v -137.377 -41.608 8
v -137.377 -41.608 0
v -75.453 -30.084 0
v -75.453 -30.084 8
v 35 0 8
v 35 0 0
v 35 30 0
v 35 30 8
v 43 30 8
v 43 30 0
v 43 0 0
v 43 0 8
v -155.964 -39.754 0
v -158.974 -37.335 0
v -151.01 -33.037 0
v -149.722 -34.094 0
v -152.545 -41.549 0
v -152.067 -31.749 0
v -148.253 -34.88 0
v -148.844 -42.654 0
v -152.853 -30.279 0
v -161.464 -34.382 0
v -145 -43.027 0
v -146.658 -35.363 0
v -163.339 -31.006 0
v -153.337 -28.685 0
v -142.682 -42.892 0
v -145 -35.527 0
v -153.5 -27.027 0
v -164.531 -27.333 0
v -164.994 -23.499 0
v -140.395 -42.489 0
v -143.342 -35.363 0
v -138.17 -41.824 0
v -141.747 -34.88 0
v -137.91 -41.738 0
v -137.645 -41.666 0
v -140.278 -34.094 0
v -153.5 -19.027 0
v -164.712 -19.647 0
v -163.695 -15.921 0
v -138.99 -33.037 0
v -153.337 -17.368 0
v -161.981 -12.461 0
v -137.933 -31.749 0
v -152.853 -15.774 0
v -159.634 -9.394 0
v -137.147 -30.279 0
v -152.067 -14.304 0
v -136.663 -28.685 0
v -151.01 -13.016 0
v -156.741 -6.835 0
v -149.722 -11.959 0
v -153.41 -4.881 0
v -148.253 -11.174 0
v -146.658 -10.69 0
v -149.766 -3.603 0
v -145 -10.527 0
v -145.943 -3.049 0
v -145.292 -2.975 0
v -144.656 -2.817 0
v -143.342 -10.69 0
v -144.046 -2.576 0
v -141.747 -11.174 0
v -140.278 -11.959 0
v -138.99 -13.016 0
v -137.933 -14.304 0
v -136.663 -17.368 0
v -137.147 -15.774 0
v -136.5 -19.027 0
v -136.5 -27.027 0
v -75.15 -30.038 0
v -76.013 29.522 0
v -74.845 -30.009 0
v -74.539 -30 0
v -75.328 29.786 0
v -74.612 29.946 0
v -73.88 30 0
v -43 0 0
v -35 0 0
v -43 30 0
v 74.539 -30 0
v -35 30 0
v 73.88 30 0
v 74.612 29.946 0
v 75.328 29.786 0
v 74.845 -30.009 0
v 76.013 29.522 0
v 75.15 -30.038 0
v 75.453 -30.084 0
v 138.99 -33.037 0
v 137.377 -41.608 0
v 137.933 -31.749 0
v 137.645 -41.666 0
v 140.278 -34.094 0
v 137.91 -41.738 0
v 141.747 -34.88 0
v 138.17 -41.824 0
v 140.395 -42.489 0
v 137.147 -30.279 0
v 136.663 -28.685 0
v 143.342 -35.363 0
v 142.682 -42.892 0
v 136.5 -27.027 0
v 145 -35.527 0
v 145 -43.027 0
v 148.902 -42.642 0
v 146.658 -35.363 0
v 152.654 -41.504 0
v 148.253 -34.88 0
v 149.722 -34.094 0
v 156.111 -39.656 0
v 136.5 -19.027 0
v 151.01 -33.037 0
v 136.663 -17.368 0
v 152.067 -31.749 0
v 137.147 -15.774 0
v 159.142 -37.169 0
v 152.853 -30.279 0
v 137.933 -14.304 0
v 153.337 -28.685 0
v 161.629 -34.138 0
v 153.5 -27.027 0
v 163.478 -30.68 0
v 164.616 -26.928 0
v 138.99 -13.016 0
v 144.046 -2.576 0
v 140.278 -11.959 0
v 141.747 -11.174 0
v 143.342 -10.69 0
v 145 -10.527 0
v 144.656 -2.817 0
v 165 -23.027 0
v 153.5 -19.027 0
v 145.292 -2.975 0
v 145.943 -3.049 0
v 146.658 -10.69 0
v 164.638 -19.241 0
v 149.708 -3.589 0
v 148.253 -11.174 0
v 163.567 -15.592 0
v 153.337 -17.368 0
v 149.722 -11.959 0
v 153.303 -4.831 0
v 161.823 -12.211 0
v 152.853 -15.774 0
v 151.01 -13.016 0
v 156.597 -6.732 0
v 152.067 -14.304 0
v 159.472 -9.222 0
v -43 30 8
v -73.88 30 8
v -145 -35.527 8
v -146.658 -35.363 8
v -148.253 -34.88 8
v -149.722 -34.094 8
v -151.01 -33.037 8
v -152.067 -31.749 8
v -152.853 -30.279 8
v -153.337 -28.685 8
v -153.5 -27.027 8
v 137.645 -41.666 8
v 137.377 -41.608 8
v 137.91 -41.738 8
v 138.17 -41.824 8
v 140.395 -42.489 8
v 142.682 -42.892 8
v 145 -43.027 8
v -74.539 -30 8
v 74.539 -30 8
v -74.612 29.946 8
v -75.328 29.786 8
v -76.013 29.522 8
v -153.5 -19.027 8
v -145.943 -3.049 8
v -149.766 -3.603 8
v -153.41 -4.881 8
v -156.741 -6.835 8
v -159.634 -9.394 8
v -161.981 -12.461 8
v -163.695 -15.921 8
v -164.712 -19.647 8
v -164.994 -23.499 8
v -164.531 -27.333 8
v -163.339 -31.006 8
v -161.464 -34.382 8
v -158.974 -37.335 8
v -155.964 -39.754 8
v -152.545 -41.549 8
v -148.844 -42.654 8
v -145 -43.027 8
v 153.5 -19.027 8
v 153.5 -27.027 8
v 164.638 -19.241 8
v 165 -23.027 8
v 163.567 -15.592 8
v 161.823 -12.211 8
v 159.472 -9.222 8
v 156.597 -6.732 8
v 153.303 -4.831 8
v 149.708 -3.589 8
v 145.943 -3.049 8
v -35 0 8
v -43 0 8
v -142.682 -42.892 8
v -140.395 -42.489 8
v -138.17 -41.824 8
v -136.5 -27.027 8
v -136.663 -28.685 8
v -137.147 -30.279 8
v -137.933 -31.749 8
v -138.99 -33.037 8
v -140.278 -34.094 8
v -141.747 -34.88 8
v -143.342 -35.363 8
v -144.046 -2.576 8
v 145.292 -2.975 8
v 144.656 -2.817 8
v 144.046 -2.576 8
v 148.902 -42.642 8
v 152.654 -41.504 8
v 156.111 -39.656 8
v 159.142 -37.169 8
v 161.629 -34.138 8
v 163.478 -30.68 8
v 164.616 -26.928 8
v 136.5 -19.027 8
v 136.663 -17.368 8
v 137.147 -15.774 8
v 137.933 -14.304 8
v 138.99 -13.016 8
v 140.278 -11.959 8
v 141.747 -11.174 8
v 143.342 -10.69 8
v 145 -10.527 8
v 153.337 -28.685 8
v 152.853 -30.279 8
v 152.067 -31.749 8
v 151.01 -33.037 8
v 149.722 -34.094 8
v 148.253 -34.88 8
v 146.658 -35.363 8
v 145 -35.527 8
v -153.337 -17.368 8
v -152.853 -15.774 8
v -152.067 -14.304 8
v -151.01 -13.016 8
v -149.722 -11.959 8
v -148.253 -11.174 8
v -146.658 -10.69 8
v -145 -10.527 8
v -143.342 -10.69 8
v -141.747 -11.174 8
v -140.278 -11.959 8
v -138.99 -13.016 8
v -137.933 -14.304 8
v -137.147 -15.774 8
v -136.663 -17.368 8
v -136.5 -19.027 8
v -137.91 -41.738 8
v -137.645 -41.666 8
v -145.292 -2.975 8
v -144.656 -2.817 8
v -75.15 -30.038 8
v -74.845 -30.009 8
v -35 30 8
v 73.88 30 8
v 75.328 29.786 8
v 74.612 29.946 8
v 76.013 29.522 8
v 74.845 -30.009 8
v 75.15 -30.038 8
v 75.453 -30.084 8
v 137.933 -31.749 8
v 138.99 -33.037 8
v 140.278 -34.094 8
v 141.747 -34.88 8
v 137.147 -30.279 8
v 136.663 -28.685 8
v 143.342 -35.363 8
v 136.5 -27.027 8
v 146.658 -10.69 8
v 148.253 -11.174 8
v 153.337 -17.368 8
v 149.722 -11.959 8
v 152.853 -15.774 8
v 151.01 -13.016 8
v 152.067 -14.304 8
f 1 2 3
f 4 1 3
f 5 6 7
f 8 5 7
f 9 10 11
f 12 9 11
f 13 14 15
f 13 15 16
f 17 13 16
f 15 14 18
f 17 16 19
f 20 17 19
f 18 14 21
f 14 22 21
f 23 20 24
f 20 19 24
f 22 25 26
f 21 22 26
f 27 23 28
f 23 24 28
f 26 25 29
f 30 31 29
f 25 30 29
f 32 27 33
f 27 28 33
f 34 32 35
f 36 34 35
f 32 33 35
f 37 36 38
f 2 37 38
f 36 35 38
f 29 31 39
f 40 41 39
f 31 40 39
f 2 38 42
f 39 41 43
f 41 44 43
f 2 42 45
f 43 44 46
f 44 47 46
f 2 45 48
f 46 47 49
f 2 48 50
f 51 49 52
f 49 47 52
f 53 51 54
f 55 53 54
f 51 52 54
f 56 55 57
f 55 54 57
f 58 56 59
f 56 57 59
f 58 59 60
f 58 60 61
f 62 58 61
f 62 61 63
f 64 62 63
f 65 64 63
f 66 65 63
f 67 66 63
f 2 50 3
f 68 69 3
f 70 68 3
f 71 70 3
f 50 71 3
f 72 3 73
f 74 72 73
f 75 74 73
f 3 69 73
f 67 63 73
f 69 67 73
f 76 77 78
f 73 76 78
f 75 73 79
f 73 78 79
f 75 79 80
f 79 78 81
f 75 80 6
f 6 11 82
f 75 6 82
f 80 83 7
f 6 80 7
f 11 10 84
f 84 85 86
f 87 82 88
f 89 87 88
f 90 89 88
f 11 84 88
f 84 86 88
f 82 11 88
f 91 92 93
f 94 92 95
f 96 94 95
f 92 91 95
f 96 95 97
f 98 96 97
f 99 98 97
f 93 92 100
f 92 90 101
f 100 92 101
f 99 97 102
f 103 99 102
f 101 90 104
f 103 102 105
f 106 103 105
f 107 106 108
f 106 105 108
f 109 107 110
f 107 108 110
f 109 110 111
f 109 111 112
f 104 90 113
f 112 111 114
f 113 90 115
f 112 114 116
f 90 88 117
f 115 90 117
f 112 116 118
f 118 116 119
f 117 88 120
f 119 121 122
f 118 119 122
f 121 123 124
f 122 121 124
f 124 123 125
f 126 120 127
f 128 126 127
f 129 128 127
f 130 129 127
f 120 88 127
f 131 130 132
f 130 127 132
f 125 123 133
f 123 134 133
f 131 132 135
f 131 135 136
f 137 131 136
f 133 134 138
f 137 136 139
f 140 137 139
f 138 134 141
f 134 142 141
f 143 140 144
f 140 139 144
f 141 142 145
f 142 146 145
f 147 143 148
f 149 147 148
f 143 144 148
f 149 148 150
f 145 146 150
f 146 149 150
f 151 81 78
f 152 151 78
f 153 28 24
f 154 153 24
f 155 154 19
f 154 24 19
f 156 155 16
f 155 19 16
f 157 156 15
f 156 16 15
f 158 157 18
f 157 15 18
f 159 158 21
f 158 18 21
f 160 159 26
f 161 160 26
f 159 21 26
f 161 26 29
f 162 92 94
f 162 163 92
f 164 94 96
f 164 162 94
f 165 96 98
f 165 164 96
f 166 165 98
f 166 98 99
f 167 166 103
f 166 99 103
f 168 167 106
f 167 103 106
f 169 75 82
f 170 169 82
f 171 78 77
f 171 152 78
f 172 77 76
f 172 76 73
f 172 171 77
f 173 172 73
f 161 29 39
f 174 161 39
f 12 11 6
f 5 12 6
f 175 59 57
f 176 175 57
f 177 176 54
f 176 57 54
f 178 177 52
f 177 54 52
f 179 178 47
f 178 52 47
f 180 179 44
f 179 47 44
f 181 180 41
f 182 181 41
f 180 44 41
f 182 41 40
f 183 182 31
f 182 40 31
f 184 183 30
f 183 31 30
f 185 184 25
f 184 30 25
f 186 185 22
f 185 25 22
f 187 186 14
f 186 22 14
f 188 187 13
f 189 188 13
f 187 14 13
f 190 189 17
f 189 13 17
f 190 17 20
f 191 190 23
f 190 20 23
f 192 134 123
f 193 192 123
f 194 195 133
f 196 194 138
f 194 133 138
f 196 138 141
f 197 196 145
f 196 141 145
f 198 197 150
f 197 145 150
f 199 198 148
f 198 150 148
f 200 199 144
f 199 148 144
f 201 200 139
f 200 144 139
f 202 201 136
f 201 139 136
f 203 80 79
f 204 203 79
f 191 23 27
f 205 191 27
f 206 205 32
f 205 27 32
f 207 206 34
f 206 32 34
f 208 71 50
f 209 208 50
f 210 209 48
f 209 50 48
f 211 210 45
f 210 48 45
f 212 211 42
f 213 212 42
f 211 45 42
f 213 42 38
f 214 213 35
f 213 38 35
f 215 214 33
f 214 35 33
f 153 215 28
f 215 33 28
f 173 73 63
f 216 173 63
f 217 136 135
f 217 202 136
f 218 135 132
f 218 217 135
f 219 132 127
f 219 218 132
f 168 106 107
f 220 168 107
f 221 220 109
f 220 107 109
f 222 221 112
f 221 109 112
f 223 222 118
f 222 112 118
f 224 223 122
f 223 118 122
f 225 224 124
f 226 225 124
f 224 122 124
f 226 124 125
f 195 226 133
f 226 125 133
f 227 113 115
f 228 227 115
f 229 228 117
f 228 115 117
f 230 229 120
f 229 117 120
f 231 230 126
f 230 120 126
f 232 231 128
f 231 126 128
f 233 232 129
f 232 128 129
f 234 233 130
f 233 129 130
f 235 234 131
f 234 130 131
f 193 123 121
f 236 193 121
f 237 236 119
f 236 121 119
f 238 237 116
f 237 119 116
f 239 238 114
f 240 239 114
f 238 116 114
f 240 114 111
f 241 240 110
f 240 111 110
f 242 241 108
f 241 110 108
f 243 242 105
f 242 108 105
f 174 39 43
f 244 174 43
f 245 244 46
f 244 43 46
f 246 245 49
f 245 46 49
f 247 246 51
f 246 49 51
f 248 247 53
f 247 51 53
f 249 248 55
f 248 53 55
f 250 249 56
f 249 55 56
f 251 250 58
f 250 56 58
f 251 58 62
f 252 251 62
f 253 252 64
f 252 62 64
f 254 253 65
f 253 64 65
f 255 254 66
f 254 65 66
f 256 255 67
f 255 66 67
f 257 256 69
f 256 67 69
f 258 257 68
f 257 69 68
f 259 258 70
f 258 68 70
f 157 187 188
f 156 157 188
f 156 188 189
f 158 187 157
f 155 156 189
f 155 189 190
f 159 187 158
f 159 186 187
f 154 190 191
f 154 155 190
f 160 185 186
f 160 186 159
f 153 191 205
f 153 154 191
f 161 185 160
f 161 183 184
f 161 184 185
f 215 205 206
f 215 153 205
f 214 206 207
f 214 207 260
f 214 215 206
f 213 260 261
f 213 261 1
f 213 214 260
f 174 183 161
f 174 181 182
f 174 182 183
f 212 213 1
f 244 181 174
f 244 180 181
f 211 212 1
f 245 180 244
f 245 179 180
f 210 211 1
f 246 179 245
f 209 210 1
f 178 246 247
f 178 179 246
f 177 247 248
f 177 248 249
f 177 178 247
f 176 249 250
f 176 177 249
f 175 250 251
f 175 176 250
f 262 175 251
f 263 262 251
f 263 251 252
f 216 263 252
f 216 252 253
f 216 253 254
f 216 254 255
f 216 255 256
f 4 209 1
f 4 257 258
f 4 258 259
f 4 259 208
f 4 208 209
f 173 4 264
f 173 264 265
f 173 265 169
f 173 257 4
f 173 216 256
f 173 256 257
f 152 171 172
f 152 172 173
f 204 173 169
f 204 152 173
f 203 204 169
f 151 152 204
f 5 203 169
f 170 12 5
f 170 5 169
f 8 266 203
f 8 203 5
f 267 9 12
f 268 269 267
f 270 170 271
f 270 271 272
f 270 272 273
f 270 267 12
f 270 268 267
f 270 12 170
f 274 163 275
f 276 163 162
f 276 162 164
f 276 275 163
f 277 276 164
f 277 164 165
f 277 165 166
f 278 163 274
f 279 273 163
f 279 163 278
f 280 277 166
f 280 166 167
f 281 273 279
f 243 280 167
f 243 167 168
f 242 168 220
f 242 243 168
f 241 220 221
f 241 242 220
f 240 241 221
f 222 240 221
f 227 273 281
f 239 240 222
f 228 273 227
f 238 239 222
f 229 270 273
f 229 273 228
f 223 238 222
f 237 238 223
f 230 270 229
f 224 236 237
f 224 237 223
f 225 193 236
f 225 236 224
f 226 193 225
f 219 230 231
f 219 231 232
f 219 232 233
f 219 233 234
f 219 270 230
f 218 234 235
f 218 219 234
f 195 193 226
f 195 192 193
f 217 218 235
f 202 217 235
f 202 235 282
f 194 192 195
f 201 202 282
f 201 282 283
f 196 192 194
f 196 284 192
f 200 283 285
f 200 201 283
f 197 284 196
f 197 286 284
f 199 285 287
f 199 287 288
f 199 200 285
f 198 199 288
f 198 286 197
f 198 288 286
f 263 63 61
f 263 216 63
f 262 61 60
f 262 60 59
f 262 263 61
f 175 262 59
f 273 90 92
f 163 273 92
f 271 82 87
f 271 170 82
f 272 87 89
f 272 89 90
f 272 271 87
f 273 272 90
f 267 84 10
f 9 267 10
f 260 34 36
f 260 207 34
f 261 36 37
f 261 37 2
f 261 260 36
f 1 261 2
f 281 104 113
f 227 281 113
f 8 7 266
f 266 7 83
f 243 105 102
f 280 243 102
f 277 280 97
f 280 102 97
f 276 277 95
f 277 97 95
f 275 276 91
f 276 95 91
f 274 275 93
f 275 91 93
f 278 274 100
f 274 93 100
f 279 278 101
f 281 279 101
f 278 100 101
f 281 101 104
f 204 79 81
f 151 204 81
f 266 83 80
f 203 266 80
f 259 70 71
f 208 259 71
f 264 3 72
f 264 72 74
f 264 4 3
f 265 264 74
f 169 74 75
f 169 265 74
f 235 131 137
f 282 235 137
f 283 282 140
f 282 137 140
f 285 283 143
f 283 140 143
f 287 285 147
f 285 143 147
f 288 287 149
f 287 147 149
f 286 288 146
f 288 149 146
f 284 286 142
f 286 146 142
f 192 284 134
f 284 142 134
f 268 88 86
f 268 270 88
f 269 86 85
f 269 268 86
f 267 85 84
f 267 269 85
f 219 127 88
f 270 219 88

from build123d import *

# Parameters (mm, degrees)
F1_DEPTH = 8
F2_R     = 5


with BuildPart() as f1:
    # F0 (on Top) → F1 (new body)
    with BuildSketch(Plane.XY):
        with BuildLine():
            ThreePointArc((-145, -43.026655901), (-141.3409185754, -42.6890851285), (-137.805357045, -41.6877682137))
            Line((-137.805357045, -41.6877682137), (-145, -43.026655901))
        make_face()
        with BuildLine():
            Line((145, -43.026655901), (137.805357045, -41.6877682137))
            ThreePointArc((137.805357045, -41.6877682137), (141.3409185754, -42.6890851285), (145, -43.026655901))
        make_face()
        with BuildLine():
            Line((-137.805357045, -41.6877682137), (-75, -30))
            Line((-75, -30), (-75, 30))
            Line((-75, 30), (-145, -3.026655901))
            ThreePointArc((-145, -3.026655901), (-130.8578643763, -8.8845202772), (-125, -23.026655901))
            ThreePointArc((-125, -23.026655901), (-128.5092016703, -34.3427316541), (-137.805357045, -41.6877682137))
        make_face()
        with BuildLine():
            Line((75, 30), (75, -30))
            Line((75, -30), (137.805357045, -41.6877682137))
            ThreePointArc((137.805357045, -41.6877682137), (125.3375707725, -19.3675744763), (145, -3.026655901))
            Line((145, -3.026655901), (75, 30))
        make_face()
        Polygon((-75, 30), (-75, -30), (-66.3212612271, -30), (75, -30), (75, 30), (43, 30), (43, 0), (35, 0), (35, 30), (-35, 30), (-35, 0), (-43, 0), (-43, 30), align=None)
        with BuildLine():
            Line((-145, -10.526655901), (-145, -3.026655901))
            ThreePointArc((-145, -3.026655901), (-165, -23.026655901), (-145, -43.026655901))
            Line((-145, -43.026655901), (-145, -35.526655901))
            ThreePointArc((-145, -35.526655901), (-151.0104076401, -33.037063541), (-153.5, -27.026655901))
            Line((-153.5, -27.026655901), (-153.5, -19.026655901))
            ThreePointArc((-153.5, -19.026655901), (-151.0104076401, -13.0162482609), (-145, -10.526655901))
        make_face()
        with BuildLine():
            ThreePointArc((165, -23.026655901), (159.1421356237, -8.8845202772), (145, -3.026655901))
            Line((145, -3.026655901), (145, -10.526655901))
            ThreePointArc((145, -10.526655901), (151.0104076401, -13.0162482609), (153.5, -19.026655901))
            Line((153.5, -19.026655901), (153.5, -27.026655901))
            ThreePointArc((153.5, -27.026655901), (151.0104076401, -33.037063541), (145, -35.526655901))
            Line((145, -35.526655901), (145, -43.026655901))
            ThreePointArc((145, -43.026655901), (159.1421356237, -37.1687915247), (165, -23.026655901))
        make_face()
        with BuildLine():
            Line((-145, -43.026655901), (-137.805357045, -41.6877682137))
            ThreePointArc((-137.805357045, -41.6877682137), (-128.5092016703, -34.3427316541), (-125, -23.026655901))
            ThreePointArc((-125, -23.026655901), (-130.8578643763, -8.8845202772), (-145, -3.026655901))
            Line((-145, -3.026655901), (-145, -10.526655901))
            ThreePointArc((-145, -10.526655901), (-138.9895923599, -13.0162482609), (-136.5, -19.026655901))
            Line((-136.5, -19.026655901), (-136.5, -27.026655901))
            ThreePointArc((-136.5, -27.026655901), (-138.9895923599, -33.037063541), (-145, -35.526655901))
            Line((-145, -35.526655901), (-145, -43.026655901))
        make_face()
        with BuildLine():
            ThreePointArc((145, -3.026655901), (125.3375707725, -19.3675744763), (137.805357045, -41.6877682137))
            Line((137.805357045, -41.6877682137), (145, -43.026655901))
            Line((145, -43.026655901), (145, -35.526655901))
            ThreePointArc((145, -35.526655901), (138.9895923599, -33.037063541), (136.5, -27.026655901))
            Line((136.5, -27.026655901), (136.5, -19.026655901))
            ThreePointArc((136.5, -19.026655901), (138.9895923599, -13.0162482609), (145, -10.526655901))
            Line((145, -10.526655901), (145, -3.026655901))
        make_face()
    extrude(amount=F1_DEPTH)

    # F2
    f2_edges = [f1.edges().sort_by_distance(p)[0] for p in [
        (75, -30, 4),
        (-75, -30, 4),
        (-75, 30, 4),
        (75, 30, 4),
        (145, -3.026656, 4),
        (-145, -3.026656, 4),
        (-137.805357, -41.687768, 4),
        (137.805357, -41.687768, 4),
    ]]
    fillet(f2_edges, radius=F2_R)


solid = f1.part
